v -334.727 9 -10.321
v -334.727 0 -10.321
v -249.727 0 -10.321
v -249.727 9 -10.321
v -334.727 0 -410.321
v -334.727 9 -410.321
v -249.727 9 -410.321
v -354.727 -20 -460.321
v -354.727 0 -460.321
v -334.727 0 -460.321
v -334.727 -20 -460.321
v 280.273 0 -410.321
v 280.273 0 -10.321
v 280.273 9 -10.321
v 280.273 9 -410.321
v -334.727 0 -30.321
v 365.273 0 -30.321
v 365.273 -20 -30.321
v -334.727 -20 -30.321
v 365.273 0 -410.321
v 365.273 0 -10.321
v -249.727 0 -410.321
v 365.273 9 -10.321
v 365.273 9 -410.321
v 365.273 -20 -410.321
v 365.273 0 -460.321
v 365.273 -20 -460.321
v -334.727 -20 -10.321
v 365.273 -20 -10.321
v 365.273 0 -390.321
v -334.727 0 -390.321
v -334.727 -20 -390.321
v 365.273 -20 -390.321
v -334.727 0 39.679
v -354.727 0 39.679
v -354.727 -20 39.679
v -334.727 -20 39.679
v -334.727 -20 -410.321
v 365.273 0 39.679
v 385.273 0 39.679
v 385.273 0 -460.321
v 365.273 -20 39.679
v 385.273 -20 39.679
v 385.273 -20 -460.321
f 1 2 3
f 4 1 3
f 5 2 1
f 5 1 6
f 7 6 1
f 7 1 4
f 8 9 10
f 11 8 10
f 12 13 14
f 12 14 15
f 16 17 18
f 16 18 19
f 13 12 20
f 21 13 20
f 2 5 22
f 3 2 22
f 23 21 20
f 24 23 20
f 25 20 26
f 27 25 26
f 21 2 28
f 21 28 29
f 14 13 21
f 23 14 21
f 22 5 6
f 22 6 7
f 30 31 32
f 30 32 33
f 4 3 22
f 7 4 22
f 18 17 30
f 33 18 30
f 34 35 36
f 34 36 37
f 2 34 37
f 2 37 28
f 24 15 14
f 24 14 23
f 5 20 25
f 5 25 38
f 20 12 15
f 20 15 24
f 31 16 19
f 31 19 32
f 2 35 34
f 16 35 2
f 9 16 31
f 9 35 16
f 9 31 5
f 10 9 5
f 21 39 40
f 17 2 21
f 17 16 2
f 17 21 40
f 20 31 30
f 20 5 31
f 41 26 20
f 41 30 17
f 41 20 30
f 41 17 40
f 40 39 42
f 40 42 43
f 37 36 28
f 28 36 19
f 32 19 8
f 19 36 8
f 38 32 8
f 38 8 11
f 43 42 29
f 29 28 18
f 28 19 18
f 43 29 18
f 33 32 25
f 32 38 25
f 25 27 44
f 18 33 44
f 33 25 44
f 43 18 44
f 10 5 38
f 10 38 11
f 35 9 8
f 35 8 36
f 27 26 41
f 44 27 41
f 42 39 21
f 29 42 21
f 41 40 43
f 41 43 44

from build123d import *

# Parameters (mm, degrees)
SKETCH1_W             = 700
SKETCH1_H             = 20
SKETCH1_W_2           = 20
SKETCH1_H_2           = 50
SKETCH1_H_3           = 360
BOSS_EXTRUDE1_DEPTH   = 20
SKETCH3_W             = 85
SKETCH3_H             = 400
BOSS_EXTRUDE5_DEPTH   = 9
BOSS_EXTRUDE5_2_DEPTH = 9


with BuildPart() as part:
    # Sketch1 → Boss-Extrude1 (new body)
    with BuildSketch(Plane(origin=(0, 0, 0), x_dir=(1, 0, 0), z_dir=(0, 1, 0))):
        with Locations((15.272669909, 400.320607763)):
            Rectangle(SKETCH1_W, SKETCH1_H)
        Polygon((-354.727330091, 30.320607763), (-334.727330091, 30.320607763), (-334.727330091, 390.320607763), (-354.727330091, 390.320607763), (-354.727330091, 225.794194933), align=None)
        with Locations((-344.727330091, -14.679392237)):
            Rectangle(SKETCH1_W_2, SKETCH1_H_2)
        with Locations((-344.727330091, 20.320607763)):
            Rectangle(SKETCH1_W_2, SKETCH1_H)
        with Locations((15.272669909, 20.320607763)):
            Rectangle(SKETCH1_W, SKETCH1_H)
        with Locations((375.272669909, -14.679392237)):
            Rectangle(SKETCH1_W_2, SKETCH1_H_2)
        with Locations((375.272669909, 20.320607763)):
            Rectangle(SKETCH1_W_2, SKETCH1_H)
        with Locations((375.272669909, 210.320607763)):
            Rectangle(SKETCH1_W_2, SKETCH1_H_3)
        with Locations((375.272669909, 400.320607763)):
            Rectangle(SKETCH1_W_2, SKETCH1_H)
        with Locations((375.272669909, 435.320607763)):
            Rectangle(SKETCH1_W_2, SKETCH1_H_2)
        with Locations((-344.727330091, 435.320607763)):
            Rectangle(SKETCH1_W_2, SKETCH1_H_2)
        with Locations((-344.727330091, 400.320607763)):
            Rectangle(SKETCH1_W_2, SKETCH1_H)
    extrude(amount=-BOSS_EXTRUDE1_DEPTH)


with BuildPart() as body_2:
    # Sketch3 → Boss-Extrude5 (new body)
    with BuildSketch(Plane(origin=(0, 0, 0), x_dir=(1, 0, 0), z_dir=(0, 1, 0))):
        with Locations((-292.227330091, 210.320607763)):
            Rectangle(SKETCH3_W, SKETCH3_H)
    extrude(amount=BOSS_EXTRUDE5_DEPTH)


with BuildPart() as body_3:
    # Sketch3 → Boss-Extrude5 2 (new body)
    with BuildSketch(Plane(origin=(0, 0, 0), x_dir=(1, 0, 0), z_dir=(0, 1, 0))):
        with Locations((322.772669909, 210.320607763)):
            Rectangle(SKETCH3_W, SKETCH3_H)
    extrude(amount=BOSS_EXTRUDE5_2_DEPTH)


solid = Compound([part.part, body_2.part, body_3.part])
